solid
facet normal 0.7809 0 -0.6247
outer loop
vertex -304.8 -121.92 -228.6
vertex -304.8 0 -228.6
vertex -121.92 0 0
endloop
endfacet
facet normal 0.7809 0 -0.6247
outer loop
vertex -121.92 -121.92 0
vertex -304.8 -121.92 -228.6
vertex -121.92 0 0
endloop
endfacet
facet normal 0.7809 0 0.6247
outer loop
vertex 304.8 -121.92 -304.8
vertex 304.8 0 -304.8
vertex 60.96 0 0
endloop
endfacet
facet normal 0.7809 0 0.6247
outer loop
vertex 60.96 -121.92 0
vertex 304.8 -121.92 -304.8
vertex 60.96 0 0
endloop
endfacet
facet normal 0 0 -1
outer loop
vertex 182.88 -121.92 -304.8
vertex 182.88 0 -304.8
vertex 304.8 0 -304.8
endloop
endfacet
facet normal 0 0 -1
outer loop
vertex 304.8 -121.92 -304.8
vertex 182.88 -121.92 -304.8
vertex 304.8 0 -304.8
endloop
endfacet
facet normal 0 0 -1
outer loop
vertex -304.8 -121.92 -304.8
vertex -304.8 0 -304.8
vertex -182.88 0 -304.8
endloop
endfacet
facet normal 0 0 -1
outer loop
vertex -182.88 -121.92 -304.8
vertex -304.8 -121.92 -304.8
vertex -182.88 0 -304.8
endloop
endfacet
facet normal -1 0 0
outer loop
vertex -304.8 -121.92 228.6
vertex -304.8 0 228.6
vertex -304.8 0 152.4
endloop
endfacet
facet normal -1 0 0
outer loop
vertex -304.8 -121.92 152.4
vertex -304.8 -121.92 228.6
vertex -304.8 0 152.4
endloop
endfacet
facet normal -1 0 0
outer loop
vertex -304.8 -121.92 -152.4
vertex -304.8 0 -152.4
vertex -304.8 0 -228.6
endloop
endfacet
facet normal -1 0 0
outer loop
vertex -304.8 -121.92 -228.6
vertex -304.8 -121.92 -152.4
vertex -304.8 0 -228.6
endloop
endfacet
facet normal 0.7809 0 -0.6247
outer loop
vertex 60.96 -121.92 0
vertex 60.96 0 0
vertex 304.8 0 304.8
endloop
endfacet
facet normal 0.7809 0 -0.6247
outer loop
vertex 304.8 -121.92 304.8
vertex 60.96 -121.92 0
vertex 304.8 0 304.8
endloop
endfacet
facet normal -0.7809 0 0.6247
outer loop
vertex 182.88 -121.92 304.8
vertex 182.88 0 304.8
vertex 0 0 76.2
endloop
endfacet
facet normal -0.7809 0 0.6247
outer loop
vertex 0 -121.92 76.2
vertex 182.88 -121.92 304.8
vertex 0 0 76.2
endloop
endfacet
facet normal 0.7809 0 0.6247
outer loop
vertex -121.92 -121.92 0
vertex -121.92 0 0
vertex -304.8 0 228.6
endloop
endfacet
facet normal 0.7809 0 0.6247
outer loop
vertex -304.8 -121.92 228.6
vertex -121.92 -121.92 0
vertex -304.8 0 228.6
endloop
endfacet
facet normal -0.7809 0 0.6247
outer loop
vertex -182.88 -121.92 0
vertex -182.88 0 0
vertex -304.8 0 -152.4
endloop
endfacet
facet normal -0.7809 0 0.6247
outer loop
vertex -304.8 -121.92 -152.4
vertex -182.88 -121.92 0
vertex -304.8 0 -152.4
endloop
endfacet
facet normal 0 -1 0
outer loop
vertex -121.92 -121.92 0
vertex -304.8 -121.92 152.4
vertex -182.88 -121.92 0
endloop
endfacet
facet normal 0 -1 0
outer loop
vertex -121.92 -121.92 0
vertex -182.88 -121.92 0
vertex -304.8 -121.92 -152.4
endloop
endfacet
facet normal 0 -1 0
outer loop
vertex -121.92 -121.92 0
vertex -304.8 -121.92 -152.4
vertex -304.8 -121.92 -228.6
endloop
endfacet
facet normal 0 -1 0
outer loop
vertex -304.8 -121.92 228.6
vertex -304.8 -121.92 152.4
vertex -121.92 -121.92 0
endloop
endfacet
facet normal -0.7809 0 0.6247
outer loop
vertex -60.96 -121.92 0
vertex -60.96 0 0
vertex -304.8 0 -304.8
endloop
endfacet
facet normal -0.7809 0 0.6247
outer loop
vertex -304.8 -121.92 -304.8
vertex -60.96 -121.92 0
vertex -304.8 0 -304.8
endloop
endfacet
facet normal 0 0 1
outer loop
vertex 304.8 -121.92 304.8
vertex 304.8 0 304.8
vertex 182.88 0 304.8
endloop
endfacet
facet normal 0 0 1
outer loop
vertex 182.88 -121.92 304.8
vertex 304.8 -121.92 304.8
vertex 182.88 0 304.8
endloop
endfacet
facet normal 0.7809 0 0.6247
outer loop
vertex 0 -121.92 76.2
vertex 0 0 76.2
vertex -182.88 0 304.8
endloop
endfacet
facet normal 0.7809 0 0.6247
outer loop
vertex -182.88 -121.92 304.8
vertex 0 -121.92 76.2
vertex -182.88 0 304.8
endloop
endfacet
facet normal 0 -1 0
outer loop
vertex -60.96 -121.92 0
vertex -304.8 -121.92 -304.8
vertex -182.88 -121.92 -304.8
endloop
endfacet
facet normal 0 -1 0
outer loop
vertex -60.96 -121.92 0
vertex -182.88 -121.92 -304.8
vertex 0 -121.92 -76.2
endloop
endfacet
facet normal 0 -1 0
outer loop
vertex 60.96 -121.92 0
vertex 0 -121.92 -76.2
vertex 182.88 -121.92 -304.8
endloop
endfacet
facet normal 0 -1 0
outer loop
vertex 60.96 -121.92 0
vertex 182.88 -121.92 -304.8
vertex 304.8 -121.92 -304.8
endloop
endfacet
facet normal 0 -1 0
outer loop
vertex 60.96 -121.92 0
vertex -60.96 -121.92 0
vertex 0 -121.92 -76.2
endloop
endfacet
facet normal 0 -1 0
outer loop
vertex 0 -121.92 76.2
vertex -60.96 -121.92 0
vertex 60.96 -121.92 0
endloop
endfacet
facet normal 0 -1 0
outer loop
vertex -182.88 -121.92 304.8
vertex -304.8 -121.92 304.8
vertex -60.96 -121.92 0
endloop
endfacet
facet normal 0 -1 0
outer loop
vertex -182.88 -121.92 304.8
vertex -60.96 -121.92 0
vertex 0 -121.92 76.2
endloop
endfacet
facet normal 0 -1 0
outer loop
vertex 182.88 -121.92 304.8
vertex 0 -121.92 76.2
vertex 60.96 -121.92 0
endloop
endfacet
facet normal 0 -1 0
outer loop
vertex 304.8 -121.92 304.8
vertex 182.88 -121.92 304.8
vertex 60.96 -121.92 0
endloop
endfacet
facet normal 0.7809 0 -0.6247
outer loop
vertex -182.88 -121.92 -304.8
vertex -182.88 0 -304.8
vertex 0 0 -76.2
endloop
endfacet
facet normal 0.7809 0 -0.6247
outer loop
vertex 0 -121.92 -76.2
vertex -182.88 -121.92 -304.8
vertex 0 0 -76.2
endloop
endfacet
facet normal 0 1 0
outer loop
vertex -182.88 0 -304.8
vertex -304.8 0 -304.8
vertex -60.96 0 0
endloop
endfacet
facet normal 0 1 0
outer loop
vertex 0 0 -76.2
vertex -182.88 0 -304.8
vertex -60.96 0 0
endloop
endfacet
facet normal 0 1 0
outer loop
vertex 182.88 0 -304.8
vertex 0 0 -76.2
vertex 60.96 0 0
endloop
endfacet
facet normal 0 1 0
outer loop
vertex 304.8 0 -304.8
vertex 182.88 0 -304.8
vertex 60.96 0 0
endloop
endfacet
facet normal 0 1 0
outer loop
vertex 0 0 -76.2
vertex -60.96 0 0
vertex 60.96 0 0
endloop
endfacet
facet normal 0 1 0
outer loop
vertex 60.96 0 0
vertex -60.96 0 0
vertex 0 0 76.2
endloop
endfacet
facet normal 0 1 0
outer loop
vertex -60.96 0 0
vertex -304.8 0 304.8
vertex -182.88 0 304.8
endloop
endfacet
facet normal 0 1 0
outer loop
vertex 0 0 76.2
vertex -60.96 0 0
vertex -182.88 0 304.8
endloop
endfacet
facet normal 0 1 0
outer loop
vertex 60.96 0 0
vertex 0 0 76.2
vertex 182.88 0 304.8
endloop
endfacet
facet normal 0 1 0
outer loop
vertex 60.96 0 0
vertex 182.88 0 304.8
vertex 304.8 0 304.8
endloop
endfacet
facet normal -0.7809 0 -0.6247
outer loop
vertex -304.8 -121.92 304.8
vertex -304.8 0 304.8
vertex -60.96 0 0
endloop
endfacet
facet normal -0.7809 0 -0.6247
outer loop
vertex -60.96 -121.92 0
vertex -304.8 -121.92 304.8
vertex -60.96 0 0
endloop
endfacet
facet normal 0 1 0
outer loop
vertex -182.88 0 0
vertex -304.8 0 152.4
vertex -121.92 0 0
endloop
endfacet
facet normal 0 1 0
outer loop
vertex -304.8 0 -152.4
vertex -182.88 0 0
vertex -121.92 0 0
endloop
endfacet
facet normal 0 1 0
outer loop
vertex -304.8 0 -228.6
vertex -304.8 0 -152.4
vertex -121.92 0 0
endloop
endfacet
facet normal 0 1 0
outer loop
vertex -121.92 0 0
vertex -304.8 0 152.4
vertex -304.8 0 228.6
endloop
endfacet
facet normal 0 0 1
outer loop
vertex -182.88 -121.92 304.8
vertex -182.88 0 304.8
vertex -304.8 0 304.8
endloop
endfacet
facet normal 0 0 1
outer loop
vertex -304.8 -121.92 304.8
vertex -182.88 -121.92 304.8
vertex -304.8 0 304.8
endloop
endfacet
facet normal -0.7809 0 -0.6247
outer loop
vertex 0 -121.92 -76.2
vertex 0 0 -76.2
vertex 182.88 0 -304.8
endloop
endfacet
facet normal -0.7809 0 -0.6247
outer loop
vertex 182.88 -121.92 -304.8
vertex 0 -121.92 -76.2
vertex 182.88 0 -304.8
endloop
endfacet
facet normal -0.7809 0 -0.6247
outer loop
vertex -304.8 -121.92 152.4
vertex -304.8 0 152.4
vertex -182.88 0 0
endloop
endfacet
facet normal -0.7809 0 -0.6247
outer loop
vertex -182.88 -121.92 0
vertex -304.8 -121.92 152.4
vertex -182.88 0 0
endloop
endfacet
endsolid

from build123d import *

# Parameters (mm, degrees)
F3_DEPTH = 121.92


# Not quite as in the source:
# - a variable given as a bare number and used for a length is read in inches; the dataset says mm whatever the document's units were


with BuildPart() as f3:
    # F2 (on Front) → F3 (new body)
    with BuildSketch(Plane.XZ):
        Polygon((60.96, 0), (304.8, 304.8), (182.88, 304.8), (0, 76.2), (-182.88, 304.8), (-304.8, 304.8), (-60.96, 0), (-304.8, -304.8), (-182.88, -304.8), (0, -76.2), (182.88, -304.8), (304.8, -304.8), align=None)
    extrude(amount=F3_DEPTH)


with BuildPart() as f3b:
    # F2 (on Front) → F3, piece 2 (new body)
    with BuildSketch(Plane.XZ):
        Polygon((-121.92, 0), (-304.8, 228.6), (-304.8, 152.4), (-182.88, 0), (-304.8, -152.4), (-304.8, -228.6), align=None)
    extrude(amount=F3_DEPTH)


solid = Compound([f3.part, f3b.part])
